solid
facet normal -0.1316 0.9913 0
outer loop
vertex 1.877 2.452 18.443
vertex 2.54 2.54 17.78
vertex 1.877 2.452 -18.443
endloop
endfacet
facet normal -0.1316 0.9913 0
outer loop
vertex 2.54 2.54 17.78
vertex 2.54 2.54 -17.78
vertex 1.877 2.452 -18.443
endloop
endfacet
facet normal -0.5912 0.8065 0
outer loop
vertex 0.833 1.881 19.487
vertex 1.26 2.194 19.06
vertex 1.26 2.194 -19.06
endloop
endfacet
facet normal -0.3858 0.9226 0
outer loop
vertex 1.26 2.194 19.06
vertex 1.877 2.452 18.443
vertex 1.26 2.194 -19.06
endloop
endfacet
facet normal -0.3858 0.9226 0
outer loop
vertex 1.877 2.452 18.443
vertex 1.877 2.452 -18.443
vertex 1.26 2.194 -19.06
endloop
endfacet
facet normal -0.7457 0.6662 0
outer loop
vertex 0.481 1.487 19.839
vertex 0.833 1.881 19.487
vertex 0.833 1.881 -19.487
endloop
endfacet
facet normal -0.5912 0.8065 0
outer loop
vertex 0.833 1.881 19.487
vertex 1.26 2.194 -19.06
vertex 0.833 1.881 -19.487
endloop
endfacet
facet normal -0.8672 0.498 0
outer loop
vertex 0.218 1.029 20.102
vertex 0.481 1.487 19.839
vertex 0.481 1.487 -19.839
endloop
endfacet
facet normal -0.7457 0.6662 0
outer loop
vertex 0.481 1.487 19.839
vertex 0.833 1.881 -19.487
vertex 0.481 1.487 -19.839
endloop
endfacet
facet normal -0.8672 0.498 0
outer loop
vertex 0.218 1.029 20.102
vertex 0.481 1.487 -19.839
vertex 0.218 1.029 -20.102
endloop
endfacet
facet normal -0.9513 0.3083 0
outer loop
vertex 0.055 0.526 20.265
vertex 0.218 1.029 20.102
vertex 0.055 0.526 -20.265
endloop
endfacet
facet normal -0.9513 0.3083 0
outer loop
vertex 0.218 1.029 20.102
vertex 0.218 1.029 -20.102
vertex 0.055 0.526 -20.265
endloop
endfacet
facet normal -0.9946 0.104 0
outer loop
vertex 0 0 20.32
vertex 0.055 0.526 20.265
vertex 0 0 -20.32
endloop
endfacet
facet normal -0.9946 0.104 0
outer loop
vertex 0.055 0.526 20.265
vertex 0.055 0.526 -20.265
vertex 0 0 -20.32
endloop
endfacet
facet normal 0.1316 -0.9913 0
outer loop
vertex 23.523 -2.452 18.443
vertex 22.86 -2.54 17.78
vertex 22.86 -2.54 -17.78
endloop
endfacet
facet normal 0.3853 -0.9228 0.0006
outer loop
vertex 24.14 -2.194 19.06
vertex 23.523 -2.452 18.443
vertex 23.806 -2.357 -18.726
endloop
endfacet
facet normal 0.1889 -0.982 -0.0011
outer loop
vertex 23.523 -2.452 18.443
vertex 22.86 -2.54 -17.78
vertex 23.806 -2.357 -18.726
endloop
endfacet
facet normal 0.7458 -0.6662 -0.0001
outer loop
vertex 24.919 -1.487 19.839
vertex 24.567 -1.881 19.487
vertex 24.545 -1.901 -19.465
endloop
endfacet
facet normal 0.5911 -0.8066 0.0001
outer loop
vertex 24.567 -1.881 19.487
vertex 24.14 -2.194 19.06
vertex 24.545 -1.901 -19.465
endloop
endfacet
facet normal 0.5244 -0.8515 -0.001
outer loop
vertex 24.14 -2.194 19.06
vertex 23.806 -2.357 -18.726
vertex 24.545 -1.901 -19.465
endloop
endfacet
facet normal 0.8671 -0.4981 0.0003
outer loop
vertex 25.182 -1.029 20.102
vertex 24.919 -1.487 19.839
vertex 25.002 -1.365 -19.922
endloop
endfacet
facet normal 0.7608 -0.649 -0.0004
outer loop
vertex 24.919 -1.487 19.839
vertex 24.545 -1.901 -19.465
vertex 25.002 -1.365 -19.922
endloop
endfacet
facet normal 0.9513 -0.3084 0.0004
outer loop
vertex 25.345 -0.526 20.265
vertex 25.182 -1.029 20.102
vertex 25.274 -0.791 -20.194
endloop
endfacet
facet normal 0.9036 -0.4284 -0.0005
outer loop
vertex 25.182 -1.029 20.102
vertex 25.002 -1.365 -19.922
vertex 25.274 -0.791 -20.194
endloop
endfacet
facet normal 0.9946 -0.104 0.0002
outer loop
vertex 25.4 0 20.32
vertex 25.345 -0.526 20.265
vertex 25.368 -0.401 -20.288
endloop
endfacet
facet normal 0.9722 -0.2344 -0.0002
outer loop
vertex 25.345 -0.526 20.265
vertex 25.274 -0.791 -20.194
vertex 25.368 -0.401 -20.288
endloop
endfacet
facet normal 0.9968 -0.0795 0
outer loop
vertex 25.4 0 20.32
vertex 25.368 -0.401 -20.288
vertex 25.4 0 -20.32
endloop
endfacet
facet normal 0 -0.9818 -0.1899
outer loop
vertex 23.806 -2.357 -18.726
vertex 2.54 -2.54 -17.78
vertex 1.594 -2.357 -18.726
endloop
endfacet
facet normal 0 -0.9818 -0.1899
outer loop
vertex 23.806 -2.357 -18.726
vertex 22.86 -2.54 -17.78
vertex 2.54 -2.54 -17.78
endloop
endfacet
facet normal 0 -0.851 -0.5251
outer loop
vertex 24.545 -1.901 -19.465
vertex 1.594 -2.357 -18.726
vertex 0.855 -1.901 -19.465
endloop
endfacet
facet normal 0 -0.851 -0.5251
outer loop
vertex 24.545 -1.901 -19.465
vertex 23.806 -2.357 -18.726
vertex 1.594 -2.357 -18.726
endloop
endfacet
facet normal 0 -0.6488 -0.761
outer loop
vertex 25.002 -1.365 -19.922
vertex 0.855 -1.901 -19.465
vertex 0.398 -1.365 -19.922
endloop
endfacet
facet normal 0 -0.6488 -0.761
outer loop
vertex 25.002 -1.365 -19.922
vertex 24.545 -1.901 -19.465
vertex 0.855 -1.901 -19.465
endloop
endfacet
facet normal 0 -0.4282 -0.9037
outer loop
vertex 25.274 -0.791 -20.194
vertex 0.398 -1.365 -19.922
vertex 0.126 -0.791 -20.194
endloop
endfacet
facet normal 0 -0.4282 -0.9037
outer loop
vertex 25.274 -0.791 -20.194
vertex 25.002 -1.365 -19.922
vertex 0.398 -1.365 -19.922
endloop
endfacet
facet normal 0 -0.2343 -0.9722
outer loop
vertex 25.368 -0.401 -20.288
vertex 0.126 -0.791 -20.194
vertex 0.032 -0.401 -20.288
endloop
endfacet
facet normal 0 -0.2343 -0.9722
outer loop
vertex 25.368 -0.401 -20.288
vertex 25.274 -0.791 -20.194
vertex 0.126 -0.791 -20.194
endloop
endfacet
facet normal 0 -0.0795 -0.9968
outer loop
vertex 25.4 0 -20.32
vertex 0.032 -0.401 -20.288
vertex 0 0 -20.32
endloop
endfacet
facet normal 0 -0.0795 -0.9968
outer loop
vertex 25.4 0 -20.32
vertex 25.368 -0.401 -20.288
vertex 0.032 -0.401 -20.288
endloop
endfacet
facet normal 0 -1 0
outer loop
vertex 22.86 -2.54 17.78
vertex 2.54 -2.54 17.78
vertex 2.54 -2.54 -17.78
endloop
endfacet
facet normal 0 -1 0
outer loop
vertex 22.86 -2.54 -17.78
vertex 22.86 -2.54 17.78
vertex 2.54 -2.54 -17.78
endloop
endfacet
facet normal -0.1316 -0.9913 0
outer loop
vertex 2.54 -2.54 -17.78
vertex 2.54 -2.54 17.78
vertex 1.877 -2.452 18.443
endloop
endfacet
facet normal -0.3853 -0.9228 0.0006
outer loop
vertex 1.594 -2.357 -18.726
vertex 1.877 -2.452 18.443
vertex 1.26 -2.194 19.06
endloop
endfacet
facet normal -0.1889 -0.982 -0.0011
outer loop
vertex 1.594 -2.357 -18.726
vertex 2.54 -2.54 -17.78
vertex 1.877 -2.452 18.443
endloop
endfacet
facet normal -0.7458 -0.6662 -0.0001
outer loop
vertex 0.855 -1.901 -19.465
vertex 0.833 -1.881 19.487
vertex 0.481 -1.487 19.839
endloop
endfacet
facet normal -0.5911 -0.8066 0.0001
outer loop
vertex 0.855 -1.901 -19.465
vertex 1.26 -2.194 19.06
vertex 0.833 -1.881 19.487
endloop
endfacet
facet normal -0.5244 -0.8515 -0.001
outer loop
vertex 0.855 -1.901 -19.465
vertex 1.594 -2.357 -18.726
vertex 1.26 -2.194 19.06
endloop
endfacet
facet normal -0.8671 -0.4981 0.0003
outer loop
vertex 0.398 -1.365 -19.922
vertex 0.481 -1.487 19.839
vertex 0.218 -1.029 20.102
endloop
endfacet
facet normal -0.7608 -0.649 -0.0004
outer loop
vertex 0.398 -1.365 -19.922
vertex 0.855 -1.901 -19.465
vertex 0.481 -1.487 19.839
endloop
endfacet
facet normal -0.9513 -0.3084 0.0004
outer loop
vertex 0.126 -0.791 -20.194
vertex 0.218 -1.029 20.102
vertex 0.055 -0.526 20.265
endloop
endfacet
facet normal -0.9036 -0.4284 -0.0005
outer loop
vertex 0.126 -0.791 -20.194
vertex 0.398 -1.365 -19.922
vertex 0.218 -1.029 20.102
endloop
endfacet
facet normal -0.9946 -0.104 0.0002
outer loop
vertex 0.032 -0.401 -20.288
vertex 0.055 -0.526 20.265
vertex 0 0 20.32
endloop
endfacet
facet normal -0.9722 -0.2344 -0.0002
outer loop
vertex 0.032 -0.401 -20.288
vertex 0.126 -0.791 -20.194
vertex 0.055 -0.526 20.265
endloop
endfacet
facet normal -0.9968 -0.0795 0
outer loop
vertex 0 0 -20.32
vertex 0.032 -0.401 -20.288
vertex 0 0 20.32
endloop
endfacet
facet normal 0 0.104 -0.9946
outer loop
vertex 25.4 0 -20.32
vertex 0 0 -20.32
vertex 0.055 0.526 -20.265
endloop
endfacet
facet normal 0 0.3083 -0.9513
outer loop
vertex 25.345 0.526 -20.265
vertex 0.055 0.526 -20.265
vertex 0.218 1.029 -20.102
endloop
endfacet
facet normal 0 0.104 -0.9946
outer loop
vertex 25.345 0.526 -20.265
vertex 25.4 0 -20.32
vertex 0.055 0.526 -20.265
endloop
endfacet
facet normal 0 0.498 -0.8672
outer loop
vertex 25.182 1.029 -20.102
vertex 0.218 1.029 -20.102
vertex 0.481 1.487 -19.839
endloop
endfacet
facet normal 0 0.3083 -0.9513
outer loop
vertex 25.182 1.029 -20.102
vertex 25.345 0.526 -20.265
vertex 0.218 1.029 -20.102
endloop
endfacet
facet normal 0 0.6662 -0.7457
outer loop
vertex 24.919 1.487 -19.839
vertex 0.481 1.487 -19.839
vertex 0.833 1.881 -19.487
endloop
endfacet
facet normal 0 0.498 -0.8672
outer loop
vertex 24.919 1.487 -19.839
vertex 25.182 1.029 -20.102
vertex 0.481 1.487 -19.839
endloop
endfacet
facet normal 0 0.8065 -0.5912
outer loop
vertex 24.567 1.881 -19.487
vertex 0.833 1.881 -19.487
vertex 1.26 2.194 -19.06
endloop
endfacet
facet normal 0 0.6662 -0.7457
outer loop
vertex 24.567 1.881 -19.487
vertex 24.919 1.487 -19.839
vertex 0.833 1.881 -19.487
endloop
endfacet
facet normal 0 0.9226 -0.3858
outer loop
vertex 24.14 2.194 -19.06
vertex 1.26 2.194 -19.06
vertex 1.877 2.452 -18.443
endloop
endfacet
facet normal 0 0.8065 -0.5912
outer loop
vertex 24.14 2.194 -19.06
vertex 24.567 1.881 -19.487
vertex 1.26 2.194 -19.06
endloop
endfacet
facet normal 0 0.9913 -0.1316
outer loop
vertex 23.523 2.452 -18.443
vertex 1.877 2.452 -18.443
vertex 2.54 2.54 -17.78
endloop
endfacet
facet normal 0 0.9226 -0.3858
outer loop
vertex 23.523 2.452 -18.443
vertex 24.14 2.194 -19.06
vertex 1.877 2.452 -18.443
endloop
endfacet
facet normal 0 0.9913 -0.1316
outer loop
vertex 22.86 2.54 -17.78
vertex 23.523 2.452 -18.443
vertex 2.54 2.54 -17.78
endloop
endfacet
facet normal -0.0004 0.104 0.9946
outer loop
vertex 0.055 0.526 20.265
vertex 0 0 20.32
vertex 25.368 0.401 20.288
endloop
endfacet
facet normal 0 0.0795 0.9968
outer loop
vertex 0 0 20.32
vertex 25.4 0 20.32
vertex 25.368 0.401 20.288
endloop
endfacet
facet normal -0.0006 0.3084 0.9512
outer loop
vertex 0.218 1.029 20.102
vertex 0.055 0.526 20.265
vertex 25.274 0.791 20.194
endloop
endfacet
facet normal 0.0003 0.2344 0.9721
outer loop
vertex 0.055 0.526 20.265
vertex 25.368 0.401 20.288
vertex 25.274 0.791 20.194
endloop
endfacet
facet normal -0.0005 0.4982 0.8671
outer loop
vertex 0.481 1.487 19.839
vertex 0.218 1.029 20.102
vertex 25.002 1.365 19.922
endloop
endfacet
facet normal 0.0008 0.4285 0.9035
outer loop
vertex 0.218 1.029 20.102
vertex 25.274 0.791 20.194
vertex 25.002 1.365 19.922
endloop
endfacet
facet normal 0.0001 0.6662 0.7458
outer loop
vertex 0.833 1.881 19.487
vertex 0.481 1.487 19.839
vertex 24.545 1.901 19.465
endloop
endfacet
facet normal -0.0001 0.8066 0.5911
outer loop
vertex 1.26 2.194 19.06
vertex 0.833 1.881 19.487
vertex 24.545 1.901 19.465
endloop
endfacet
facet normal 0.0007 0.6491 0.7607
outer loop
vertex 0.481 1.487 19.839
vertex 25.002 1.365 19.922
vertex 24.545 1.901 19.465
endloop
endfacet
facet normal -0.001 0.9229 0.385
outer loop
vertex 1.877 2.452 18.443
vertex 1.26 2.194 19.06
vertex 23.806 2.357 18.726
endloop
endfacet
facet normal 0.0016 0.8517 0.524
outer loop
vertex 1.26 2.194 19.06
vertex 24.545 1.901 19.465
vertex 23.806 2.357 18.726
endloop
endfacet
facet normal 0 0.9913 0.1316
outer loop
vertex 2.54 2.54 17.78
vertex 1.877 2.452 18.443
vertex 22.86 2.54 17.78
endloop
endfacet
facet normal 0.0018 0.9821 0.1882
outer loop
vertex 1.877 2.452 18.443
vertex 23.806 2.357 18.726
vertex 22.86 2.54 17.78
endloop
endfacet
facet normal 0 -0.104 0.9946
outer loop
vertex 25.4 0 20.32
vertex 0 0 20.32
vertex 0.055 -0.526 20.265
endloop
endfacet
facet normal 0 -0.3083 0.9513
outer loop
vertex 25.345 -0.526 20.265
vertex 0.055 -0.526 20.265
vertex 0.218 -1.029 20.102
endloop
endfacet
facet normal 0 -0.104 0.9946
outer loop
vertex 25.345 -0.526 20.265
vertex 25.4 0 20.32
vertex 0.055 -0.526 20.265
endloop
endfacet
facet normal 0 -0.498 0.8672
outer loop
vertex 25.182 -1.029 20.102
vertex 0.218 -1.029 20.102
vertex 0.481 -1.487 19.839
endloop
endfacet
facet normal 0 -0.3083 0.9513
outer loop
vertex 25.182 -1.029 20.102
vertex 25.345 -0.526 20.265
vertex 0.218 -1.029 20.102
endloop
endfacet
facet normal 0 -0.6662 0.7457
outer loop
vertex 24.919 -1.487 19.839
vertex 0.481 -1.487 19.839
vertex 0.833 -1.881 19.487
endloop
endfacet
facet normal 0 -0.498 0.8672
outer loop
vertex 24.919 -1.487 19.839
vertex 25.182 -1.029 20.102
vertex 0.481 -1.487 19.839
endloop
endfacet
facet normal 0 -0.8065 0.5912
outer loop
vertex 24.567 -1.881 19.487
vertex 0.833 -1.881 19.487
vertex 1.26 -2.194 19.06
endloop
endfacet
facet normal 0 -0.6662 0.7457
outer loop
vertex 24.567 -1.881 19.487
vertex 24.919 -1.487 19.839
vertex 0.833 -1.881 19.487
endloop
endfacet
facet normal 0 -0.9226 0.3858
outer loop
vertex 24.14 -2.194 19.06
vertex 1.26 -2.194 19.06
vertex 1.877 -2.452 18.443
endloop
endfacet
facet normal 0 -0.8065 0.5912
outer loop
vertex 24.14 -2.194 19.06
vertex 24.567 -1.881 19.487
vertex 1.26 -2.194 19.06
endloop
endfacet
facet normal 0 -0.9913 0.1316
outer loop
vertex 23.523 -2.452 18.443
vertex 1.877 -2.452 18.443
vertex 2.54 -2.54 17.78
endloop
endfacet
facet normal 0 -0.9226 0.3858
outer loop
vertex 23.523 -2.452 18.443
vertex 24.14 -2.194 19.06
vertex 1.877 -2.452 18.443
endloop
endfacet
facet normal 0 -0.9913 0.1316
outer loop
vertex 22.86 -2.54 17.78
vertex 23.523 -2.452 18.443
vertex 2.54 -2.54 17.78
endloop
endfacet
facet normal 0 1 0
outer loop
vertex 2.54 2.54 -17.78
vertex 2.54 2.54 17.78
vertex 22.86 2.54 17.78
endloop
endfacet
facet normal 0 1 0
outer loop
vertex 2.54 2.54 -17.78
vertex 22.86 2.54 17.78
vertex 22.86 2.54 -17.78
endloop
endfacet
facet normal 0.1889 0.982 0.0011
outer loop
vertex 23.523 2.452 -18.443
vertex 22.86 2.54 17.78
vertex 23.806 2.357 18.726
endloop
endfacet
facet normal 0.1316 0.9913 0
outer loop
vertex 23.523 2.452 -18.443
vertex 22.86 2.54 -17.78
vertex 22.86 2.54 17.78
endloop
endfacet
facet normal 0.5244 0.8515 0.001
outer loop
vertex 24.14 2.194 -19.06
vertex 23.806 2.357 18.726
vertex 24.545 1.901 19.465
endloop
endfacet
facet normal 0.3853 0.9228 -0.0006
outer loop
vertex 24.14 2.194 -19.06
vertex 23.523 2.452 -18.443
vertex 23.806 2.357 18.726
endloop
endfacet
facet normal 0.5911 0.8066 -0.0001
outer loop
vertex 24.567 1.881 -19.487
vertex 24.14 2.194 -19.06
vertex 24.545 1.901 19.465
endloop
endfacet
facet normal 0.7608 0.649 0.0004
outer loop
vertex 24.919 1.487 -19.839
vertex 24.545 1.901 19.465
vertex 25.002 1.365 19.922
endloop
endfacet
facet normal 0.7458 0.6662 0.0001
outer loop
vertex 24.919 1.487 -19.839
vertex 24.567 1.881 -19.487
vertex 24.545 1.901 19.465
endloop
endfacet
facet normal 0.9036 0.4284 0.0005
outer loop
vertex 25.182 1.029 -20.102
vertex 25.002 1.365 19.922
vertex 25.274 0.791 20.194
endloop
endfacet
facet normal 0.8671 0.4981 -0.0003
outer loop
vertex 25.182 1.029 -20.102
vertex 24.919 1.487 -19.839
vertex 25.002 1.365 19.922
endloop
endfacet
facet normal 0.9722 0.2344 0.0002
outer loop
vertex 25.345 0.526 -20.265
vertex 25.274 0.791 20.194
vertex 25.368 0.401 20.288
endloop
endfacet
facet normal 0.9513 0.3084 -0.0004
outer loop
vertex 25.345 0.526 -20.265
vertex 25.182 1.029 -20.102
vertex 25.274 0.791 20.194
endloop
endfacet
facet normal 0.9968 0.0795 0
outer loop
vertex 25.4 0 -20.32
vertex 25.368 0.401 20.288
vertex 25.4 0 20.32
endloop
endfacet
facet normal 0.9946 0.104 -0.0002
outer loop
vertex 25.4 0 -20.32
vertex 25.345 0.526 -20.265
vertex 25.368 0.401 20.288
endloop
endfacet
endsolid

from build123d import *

# Parameters (mm, degrees)
SKETCH2_W           = 40.64
SKETCH2_H           = 5.08
BOSS_EXTRUDE1_DEPTH = 25.4
FILLET1_R           = 2.54


with BuildPart() as part:
    # Sketch2 → Boss-Extrude1 (new body)
    with BuildSketch(Plane(origin=(0, 0, 0), x_dir=(0, 0, -1), z_dir=(1, 0, 0))):
        Rectangle(SKETCH2_W, SKETCH2_H)
    extrude(amount=BOSS_EXTRUDE1_DEPTH)

    # Fillet1
    fillet1_edges = [part.edges().sort_by_distance(p)[0] for p in [
        (12.7, -2.54, 20.32),
        (25.4, -2.54, 0),
        (12.7, -2.54, -20.32),
        (0, -2.54, 0),
        (12.7, 2.54, -20.32),
        (25.4, 2.54, 0),
        (12.7, 2.54, 20.32),
        (0, 2.54, 0),
    ]]
    fillet(fillet1_edges, radius=FILLET1_R - 0.0001)  # a hair under: the kernel refuses the full size


solid = part.part
